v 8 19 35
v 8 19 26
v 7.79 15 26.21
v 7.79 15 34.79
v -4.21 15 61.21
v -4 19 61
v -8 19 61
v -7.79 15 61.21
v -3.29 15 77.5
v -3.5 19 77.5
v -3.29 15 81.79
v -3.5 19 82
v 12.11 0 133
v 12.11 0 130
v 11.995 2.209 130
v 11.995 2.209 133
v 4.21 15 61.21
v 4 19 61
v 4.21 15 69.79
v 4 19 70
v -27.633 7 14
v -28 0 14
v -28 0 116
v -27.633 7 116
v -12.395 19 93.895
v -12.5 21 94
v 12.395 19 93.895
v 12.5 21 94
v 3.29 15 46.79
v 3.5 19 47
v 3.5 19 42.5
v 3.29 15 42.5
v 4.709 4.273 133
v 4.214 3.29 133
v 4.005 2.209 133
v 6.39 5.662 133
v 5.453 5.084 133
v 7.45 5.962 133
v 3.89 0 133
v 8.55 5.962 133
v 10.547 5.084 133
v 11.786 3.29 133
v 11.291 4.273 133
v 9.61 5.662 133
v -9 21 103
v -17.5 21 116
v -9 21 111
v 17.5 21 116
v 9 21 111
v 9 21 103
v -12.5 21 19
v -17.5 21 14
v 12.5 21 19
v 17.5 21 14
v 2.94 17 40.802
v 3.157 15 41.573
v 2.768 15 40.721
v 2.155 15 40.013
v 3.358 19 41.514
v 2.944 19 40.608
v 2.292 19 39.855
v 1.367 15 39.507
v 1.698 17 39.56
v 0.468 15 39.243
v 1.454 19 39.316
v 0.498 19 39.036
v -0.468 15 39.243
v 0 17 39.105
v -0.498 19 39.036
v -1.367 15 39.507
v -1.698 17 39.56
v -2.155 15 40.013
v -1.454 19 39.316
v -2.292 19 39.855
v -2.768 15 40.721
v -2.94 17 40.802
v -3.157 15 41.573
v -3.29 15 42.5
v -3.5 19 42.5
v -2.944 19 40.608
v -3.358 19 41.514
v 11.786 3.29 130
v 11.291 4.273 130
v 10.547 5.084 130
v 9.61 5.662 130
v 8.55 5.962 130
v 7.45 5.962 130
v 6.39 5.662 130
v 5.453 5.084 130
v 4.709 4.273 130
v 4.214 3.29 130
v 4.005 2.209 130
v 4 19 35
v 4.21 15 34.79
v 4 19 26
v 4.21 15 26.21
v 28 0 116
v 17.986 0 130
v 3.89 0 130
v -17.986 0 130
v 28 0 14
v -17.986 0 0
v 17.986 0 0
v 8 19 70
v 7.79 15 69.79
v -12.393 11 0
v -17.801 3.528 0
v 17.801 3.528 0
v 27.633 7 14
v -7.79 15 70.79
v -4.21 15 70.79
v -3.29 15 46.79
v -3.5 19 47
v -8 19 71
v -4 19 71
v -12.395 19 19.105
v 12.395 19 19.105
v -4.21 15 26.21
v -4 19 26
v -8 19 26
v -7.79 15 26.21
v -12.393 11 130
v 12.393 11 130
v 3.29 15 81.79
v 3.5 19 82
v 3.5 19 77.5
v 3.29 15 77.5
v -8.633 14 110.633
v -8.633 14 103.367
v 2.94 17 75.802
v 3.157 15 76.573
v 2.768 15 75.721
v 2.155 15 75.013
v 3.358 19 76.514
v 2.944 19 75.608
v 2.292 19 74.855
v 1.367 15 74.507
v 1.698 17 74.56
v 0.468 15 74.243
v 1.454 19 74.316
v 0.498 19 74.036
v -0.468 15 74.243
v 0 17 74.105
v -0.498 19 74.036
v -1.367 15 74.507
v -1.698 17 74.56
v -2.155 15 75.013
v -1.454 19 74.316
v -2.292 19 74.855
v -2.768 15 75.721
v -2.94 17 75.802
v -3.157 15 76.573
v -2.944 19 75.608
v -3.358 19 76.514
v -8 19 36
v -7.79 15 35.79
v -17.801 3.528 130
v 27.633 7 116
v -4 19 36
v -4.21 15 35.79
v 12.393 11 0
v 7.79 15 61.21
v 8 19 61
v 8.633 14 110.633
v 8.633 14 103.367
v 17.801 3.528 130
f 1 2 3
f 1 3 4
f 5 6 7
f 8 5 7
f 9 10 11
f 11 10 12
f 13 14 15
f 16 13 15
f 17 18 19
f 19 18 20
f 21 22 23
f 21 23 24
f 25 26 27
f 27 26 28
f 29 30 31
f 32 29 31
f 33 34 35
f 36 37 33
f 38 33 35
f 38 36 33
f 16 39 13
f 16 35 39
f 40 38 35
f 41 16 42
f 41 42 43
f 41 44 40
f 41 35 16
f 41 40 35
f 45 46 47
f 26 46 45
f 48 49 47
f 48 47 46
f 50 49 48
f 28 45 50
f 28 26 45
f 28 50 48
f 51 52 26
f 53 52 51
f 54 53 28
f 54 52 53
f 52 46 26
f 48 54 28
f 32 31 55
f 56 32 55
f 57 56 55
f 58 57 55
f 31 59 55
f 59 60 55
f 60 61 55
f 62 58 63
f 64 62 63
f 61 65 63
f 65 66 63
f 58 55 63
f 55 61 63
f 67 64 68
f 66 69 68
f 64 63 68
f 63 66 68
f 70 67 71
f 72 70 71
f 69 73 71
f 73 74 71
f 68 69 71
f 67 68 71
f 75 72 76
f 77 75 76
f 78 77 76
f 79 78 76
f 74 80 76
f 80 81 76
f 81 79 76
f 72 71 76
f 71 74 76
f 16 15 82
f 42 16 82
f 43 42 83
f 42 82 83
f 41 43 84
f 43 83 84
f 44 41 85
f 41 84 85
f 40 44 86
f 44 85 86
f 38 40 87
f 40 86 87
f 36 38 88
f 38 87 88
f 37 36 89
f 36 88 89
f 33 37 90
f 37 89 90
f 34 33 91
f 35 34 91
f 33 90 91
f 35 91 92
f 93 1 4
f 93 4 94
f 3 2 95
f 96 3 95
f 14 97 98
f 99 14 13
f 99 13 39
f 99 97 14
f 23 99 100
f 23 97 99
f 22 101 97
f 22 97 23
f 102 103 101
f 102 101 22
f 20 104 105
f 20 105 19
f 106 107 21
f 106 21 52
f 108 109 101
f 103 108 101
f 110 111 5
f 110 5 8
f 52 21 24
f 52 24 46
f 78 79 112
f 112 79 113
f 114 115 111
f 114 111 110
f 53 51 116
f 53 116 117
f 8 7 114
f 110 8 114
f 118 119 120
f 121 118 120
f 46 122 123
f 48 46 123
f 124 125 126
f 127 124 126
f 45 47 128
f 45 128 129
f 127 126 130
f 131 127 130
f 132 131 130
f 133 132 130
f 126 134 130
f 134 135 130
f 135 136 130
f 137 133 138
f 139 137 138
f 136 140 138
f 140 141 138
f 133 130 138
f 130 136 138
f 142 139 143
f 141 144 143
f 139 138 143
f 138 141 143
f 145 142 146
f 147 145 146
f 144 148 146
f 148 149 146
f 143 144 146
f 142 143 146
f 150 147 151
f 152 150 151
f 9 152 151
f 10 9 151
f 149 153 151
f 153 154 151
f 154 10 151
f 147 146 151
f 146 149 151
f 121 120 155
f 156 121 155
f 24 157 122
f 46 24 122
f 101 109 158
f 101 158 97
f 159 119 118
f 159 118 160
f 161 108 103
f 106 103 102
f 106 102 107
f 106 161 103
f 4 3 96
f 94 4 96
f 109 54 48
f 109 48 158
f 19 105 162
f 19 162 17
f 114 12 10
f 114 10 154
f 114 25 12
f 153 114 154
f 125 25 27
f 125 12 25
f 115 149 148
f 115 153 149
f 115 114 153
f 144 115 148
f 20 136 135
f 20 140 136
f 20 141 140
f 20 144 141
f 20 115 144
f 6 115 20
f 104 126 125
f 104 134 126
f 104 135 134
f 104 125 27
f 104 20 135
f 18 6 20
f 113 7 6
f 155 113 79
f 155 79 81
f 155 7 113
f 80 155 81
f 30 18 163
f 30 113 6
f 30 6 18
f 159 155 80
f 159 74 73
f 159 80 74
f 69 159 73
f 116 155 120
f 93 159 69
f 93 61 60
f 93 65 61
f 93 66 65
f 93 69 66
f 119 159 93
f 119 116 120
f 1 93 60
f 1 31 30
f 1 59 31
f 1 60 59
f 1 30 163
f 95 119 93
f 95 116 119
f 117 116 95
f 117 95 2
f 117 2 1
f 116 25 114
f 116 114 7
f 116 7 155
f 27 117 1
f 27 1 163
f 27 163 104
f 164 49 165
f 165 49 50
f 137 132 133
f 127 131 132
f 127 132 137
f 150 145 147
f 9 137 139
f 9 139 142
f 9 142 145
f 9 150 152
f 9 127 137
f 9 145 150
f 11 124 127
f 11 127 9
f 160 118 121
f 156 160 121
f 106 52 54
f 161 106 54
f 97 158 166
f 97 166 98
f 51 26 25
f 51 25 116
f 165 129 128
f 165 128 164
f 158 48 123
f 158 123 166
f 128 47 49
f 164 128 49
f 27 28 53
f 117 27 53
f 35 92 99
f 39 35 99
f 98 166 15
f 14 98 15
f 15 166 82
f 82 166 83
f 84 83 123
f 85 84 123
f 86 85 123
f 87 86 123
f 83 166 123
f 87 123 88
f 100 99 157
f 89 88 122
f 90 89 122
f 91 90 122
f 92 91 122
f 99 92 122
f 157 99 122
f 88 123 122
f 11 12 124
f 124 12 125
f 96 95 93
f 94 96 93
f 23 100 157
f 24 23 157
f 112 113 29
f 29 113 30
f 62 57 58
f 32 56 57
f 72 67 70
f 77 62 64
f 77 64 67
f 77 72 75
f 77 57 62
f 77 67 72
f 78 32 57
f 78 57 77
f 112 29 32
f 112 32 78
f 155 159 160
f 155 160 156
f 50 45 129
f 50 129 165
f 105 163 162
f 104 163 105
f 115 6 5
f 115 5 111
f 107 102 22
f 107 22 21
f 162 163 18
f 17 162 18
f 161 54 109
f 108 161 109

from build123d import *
from OCP.BRepFilletAPI import BRepFilletAPI_MakeChamfer

# Parameters (mm, degrees)
EXTRUDE1_DEPTH               = 130
CHAMFER1_SIZE                = 14
CHAMFER1_SIZE2               = 10
CHAMFER2_SIZE                = 10
CHAMFER2_SIZE2               = 14
EXTRUDE2_DEPTH               = 3
SKETCH3_W                    = 25
SKETCH3_H                    = 75
CUT_EXTRUDE1_DEPTH           = 2
CUT_EXTRUDE1_DRAFT           = -3
SKETCH4_W                    = 4
SKETCH4_H                    = 9
CUT_EXTRUDE2_DEPTH           = 4
CUT_EXTRUDE2_DRAFT           = -3
SKETCH4_H_2                  = 10
CUT_EXTRUDE2_PROFILE_2_DEPTH = 4
CUT_EXTRUDE2_PROFILE_2_DRAFT = -3
CUT_EXTRUDE2_PROFILE_3_DEPTH = 4
CUT_EXTRUDE2_PROFILE_3_DRAFT = -3
LPATTERN1_COPY_1_SKETCH_W    = 4
LPATTERN1_COPY_1_SKETCH_H    = 9
LPATTERN1_COPY_1_DEPTH       = 4
LPATTERN1_COPY_1_DRAFT       = -3
LPATTERN1_COPY_2_SKETCH_W    = 4
LPATTERN1_COPY_2_SKETCH_H    = 10
LPATTERN1_COPY_2_DEPTH       = 4
LPATTERN1_COPY_2_DRAFT       = -3
LPATTERN1_COPY_3_DEPTH       = 4
LPATTERN1_COPY_3_DRAFT       = -3
LPATTERN1_COPY_4_SKETCH_W    = 4
LPATTERN1_COPY_4_SKETCH_H    = 10
LPATTERN1_COPY_4_DEPTH       = 4
LPATTERN1_COPY_4_DRAFT       = -3
LPATTERN1_COPY_5_DEPTH       = 4
LPATTERN1_COPY_5_DRAFT       = -3
SKETCH5_W                    = 18
SKETCH5_H                    = 8
CUT_EXTRUDE3_DEPTH           = 7
CUT_EXTRUDE3_DRAFT           = -3


with BuildPart() as part:
    # Sketch1 → Extrude1 (new body)
    with BuildSketch(Plane.XY):
        Polygon((17.5, 21), (27.633145545, 7), (28, 0), (-28, 0), (-27.633145545, 7), (-17.5, 21), align=None)
    extrude(amount=EXTRUDE1_DEPTH)

    # Chamfer1: one chamfer whose edges measure the first distance from different faces: ONE call of the kernel's chamfer builder (chamfer() names one face for all edges)
    chamfer1_edges_1 = [part.edges().sort_by_distance(p)[0] for p in [
        (0, 21, 130),
    ]]
    chamfer1_side_1 = [part.faces().sort_by_distance(p)[0] for p in [
        (0, 21, 65),
    ]]
    chamfer1_edges_2 = [part.edges().sort_by_distance(p)[0] for p in [
        (-22.566572773, 14, 130),
    ]]
    chamfer1_side_2 = [part.faces().sort_by_distance(p)[0] for p in [
        (-22.566572773, 14, 65),
    ]]
    chamfer1_edges_3 = [part.edges().sort_by_distance(p)[0] for p in [
        (-27.816572773, 3.5, 130),
    ]]
    chamfer1_side_3 = [part.faces().sort_by_distance(p)[0] for p in [
        (-27.816572773, 3.5, 65),
    ]]
    chamfer1_edges_4 = [part.edges().sort_by_distance(p)[0] for p in [
        (27.816572773, 3.5, 130),
    ]]
    chamfer1_side_4 = [part.faces().sort_by_distance(p)[0] for p in [
        (27.816572773, 3.5, 65),
    ]]
    chamfer1_edges_5 = [part.edges().sort_by_distance(p)[0] for p in [
        (22.566572773, 14, 130),
    ]]
    chamfer1_side_5 = [part.faces().sort_by_distance(p)[0] for p in [
        (22.566572773, 14, 65),
    ]]
    chamfer1 = BRepFilletAPI_MakeChamfer(part.part.solid().wrapped)
    for e in chamfer1_edges_1:
        chamfer1.Add(CHAMFER1_SIZE, CHAMFER1_SIZE2, e.wrapped, chamfer1_side_1[0].wrapped)  # the first distance lies on this face
    for e in chamfer1_edges_2:
        chamfer1.Add(CHAMFER1_SIZE, CHAMFER1_SIZE2, e.wrapped, chamfer1_side_2[0].wrapped)  # the first distance lies on this face
    for e in chamfer1_edges_3:
        chamfer1.Add(CHAMFER1_SIZE, CHAMFER1_SIZE2, e.wrapped, chamfer1_side_3[0].wrapped)  # the first distance lies on this face
    for e in chamfer1_edges_4:
        chamfer1.Add(CHAMFER1_SIZE, CHAMFER1_SIZE2, e.wrapped, chamfer1_side_4[0].wrapped)  # the first distance lies on this face
    for e in chamfer1_edges_5:
        chamfer1.Add(CHAMFER1_SIZE, CHAMFER1_SIZE2, e.wrapped, chamfer1_side_5[0].wrapped)  # the first distance lies on this face
    add(Compound.cast(chamfer1.Shape()), mode=Mode.REPLACE)

    # Chamfer2
    chamfer2_edges = [part.edges().sort_by_distance(p)[0] for p in [
        (-27.816572773, 3.5, 0),
        (-22.566572773, 14, 0),
        (0, 21, 0),
        (22.566572773, 14, 0),
        (27.816572773, 3.5, 0),
    ]]
    chamfer2_side = [part.faces().sort_by_distance(p)[0] for p in [
        (0, 9.6691811, 0),
    ]]
    chamfer(chamfer2_edges, length=CHAMFER2_SIZE, length2=CHAMFER2_SIZE2, reference=chamfer2_side[0])

    # Sketch2 → Extrude2 (add)
    with BuildSketch(Plane(origin=(5.745184329, -1.894827458, 130), x_dir=(1, 0, 0), z_dir=(0, 0, 1))):
        with BuildLine():
            Line((-1.855489271, 1.894827458), (6.365120614, 1.894827458))
            Line((6.365120614, 1.894827458), (6.24933381, 4.104171283))
            ThreePointArc((6.24933381, 4.104171283), (2.254815671, 7.894827458), (-1.739702468, 4.104171283))
            Line((-1.739702468, 4.104171283), (-1.855489271, 1.894827458))
        make_face()
    extrude(amount=EXTRUDE2_DEPTH)


with BuildPart() as cut_extrude1_tool:
    # Sketch3 → Cut-Extrude1 (with draft: the straight prism first)
    with BuildSketch(Plane(origin=(3.492514123, 21, 107.578199621), x_dir=(1, 0, 0), z_dir=(0, 1, 0))):
        with Locations((-3.492514123, 51.078199621)):
            Rectangle(SKETCH3_W, SKETCH3_H)
    extrude(amount=-CUT_EXTRUDE1_DEPTH)
    # Cut-Extrude1: the draft: its side faces are tilted about the plane it starts from
    cut_extrude1_sides = [cut_extrude1_tool.faces().sort_by_distance(p)[0] for p in [
        (0, 20, 19),
        (-12.5, 20, 56.5),
        (0, 20, 94),
        (12.5, 20, 56.5),
    ]]
    draft(cut_extrude1_sides, Plane(origin=(3.492514123, 21, 107.578199621), x_dir=(1, 0, 0), z_dir=(0, 1, 0)), CUT_EXTRUDE1_DRAFT)


with BuildPart() as part_1:
    add(part.part)

    # Cut-Extrude1: cut by cut_extrude1_tool
    add(cut_extrude1_tool.part, mode=Mode.SUBTRACT)


with BuildPart() as cut_extrude2_tool:
    # Sketch4 → Cut-Extrude2 (with draft: the straight prism first)
    with BuildSketch(Plane(origin=(-3.08260661, 19, 40.468913064), x_dir=(-1, 0, 0), z_dir=(0, 1, 0))):
        with Locations((-9.08260661, -9.968913064)):
            Rectangle(SKETCH4_W, SKETCH4_H)
    extrude(amount=-CUT_EXTRUDE2_DEPTH)
    # Cut-Extrude2: the draft: its side faces are tilted about the plane it starts from
    cut_extrude2_sides = [cut_extrude2_tool.faces().sort_by_distance(p)[0] for p in [
        (4, 17, 30.5),
        (6, 17, 35),
        (8, 17, 30.5),
        (6, 17, 26),
    ]]
    draft(cut_extrude2_sides, Plane(origin=(-3.08260661, 19, 40.468913064), x_dir=(-1, 0, 0), z_dir=(0, 1, 0)), CUT_EXTRUDE2_DRAFT)


with BuildPart() as part_2:
    add(part_1.part)

    # Cut-Extrude2: cut by cut_extrude2_tool
    add(cut_extrude2_tool.part, mode=Mode.SUBTRACT)


with BuildPart() as cut_extrude2_profile_2_tool:
    # Sketch4 → Cut-Extrude2 profile 2 (with draft: the straight prism first)
    with BuildSketch(Plane(origin=(-3.08260661, 19, 40.468913064), x_dir=(-1, 0, 0), z_dir=(0, 1, 0))):
        with Locations((2.91739339, -9.468913064)):
            Rectangle(SKETCH4_W, SKETCH4_H_2)
    extrude(amount=-CUT_EXTRUDE2_PROFILE_2_DEPTH)
    # Cut-Extrude2 profile 2: the draft: its side faces are tilted about the plane it starts from
    cut_extrude2_profile_2_sides = [cut_extrude2_profile_2_tool.faces().sort_by_distance(p)[0] for p in [
        (-8, 17, 31),
        (-6, 17, 36),
        (-4, 17, 31),
        (-6, 17, 26),
    ]]
    draft(cut_extrude2_profile_2_sides, Plane(origin=(-3.08260661, 19, 40.468913064), x_dir=(-1, 0, 0), z_dir=(0, 1, 0)), CUT_EXTRUDE2_PROFILE_2_DRAFT)


with BuildPart() as part_3:
    add(part_2.part)

    # Cut-Extrude2 profile 2: cut by cut_extrude2_profile_2_tool
    add(cut_extrude2_profile_2_tool.part, mode=Mode.SUBTRACT)


with BuildPart() as cut_extrude2_profile_3_tool:
    # Sketch4 → Cut-Extrude2 profile 3 (with draft: the straight prism first)
    with BuildSketch(Plane(origin=(-3.08260661, 19, 40.468913064), x_dir=(-1, 0, 0), z_dir=(0, 1, 0))):
        with BuildLine():
            Line((-6.58260661, 6.531086936), (-6.58260661, 2.031086936))
            ThreePointArc((-6.58260661, 2.031086936), (-3.08260661, -1.468913064), (0.41739339, 2.031086936))
            Line((0.41739339, 2.031086936), (0.41739339, 6.531086936))
            Line((0.41739339, 6.531086936), (-6.58260661, 6.531086936))
        make_face()
    extrude(amount=-CUT_EXTRUDE2_PROFILE_3_DEPTH)
    # Cut-Extrude2 profile 3: the draft: its side faces are tilted about the plane it starts from
    cut_extrude2_profile_3_sides = [cut_extrude2_profile_3_tool.faces().sort_by_distance(p)[0] for p in [
        (-3.5, 17, 44.75),
        (0, 17, 47),
        (3.5, 17, 44.75),
        (0, 17, 39),
    ]]
    draft(cut_extrude2_profile_3_sides, Plane(origin=(-3.08260661, 19, 40.468913064), x_dir=(-1, 0, 0), z_dir=(0, 1, 0)), CUT_EXTRUDE2_PROFILE_3_DRAFT)


with BuildPart() as part_4:
    add(part_3.part)

    # Cut-Extrude2 profile 3: cut by cut_extrude2_profile_3_tool
    add(cut_extrude2_profile_3_tool.part, mode=Mode.SUBTRACT)


with BuildPart() as lpattern1_copy_1_tool:
    # LPattern1 copy 1 sketch → LPattern1 copy 1 (with draft: the straight prism first)
    with BuildSketch(Plane(origin=(-3.08260661, 19, 75.468913064), x_dir=(-1, 0, 0), z_dir=(0, 1, 0))):
        with Locations((-9.08260661, -9.968913064)):
            Rectangle(LPATTERN1_COPY_1_SKETCH_W, LPATTERN1_COPY_1_SKETCH_H)
    extrude(amount=-LPATTERN1_COPY_1_DEPTH)
    # LPattern1 copy 1: the draft: its side faces are tilted about the plane it starts from
    lpattern1_copy_1_sides = [lpattern1_copy_1_tool.faces().sort_by_distance(p)[0] for p in [
        (4, 17, 65.5),
        (6, 17, 70),
        (8, 17, 65.5),
        (6, 17, 61),
    ]]
    draft(lpattern1_copy_1_sides, Plane(origin=(-3.08260661, 19, 75.468913064), x_dir=(-1, 0, 0), z_dir=(0, 1, 0)), LPATTERN1_COPY_1_DRAFT)


with BuildPart() as part_5:
    add(part_4.part)

    # LPattern1 copy 1: cut by lpattern1_copy_1_tool
    add(lpattern1_copy_1_tool.part, mode=Mode.SUBTRACT)


with BuildPart() as lpattern1_copy_2_tool:
    # LPattern1 copy 2 sketch → LPattern1 copy 2 (with draft: the straight prism first)
    with BuildSketch(Plane(origin=(-3.08260661, 19, 75.468913064), x_dir=(-1, 0, 0), z_dir=(0, 1, 0))):
        with Locations((2.91739339, -9.468913064)):
            Rectangle(LPATTERN1_COPY_2_SKETCH_W, LPATTERN1_COPY_2_SKETCH_H)
    extrude(amount=-LPATTERN1_COPY_2_DEPTH)
    # LPattern1 copy 2: the draft: its side faces are tilted about the plane it starts from
    lpattern1_copy_2_sides = [lpattern1_copy_2_tool.faces().sort_by_distance(p)[0] for p in [
        (-8, 17, 66),
        (-6, 17, 71),
        (-4, 17, 66),
        (-6, 17, 61),
    ]]
    draft(lpattern1_copy_2_sides, Plane(origin=(-3.08260661, 19, 75.468913064), x_dir=(-1, 0, 0), z_dir=(0, 1, 0)), LPATTERN1_COPY_2_DRAFT)


with BuildPart() as part_6:
    add(part_5.part)

    # LPattern1 copy 2: cut by lpattern1_copy_2_tool
    add(lpattern1_copy_2_tool.part, mode=Mode.SUBTRACT)


with BuildPart() as lpattern1_copy_3_tool:
    # LPattern1 copy 3 sketch → LPattern1 copy 3 (with draft: the straight prism first)
    with BuildSketch(Plane(origin=(-3.08260661, 19, 75.468913064), x_dir=(-1, 0, 0), z_dir=(0, 1, 0))):
        with BuildLine():
            Line((-6.58260661, 6.531086936), (-6.58260661, 2.031086936))
            ThreePointArc((-6.58260661, 2.031086936), (-3.08260661, -1.468913064), (0.41739339, 2.031086936))
            Line((0.41739339, 2.031086936), (0.41739339, 6.531086936))
            Line((0.41739339, 6.531086936), (-6.58260661, 6.531086936))
        make_face()
    extrude(amount=-LPATTERN1_COPY_3_DEPTH)
    # LPattern1 copy 3: the draft: its side faces are tilted about the plane it starts from
    lpattern1_copy_3_sides = [lpattern1_copy_3_tool.faces().sort_by_distance(p)[0] for p in [
        (-3.5, 17, 79.75),
        (0, 17, 82),
        (3.5, 17, 79.75),
        (0, 17, 74),
    ]]
    draft(lpattern1_copy_3_sides, Plane(origin=(-3.08260661, 19, 75.468913064), x_dir=(-1, 0, 0), z_dir=(0, 1, 0)), LPATTERN1_COPY_3_DRAFT)


with BuildPart() as part_7:
    add(part_6.part)

    # LPattern1 copy 3: cut by lpattern1_copy_3_tool
    add(lpattern1_copy_3_tool.part, mode=Mode.SUBTRACT)


with BuildPart() as lpattern1_copy_4_tool:
    # LPattern1 copy 4 sketch → LPattern1 copy 4 (with draft: the straight prism first)
    with BuildSketch(Plane(origin=(-3.08260661, 19, 75.468913064), x_dir=(-1, 0, 0), z_dir=(0, 1, 0))):
        with Locations((2.91739339, -9.468913064)):
            Rectangle(LPATTERN1_COPY_4_SKETCH_W, LPATTERN1_COPY_4_SKETCH_H)
    extrude(amount=-LPATTERN1_COPY_4_DEPTH)
    # LPattern1 copy 4: the draft: its side faces are tilted about the plane it starts from
    lpattern1_copy_4_sides = [lpattern1_copy_4_tool.faces().sort_by_distance(p)[0] for p in [
        (-8, 17, 66),
        (-6, 17, 71),
        (-4, 17, 66),
        (-6, 17, 61),
    ]]
    draft(lpattern1_copy_4_sides, Plane(origin=(-3.08260661, 19, 75.468913064), x_dir=(-1, 0, 0), z_dir=(0, 1, 0)), LPATTERN1_COPY_4_DRAFT)


with BuildPart() as part_8:
    add(part_7.part)

    # LPattern1 copy 4: cut by lpattern1_copy_4_tool
    add(lpattern1_copy_4_tool.part, mode=Mode.SUBTRACT)


with BuildPart() as lpattern1_copy_5_tool:
    # LPattern1 copy 5 sketch → LPattern1 copy 5 (with draft: the straight prism first)
    with BuildSketch(Plane(origin=(-3.08260661, 19, 75.468913064), x_dir=(-1, 0, 0), z_dir=(0, 1, 0))):
        with BuildLine():
            Line((-6.58260661, 6.531086936), (-6.58260661, 2.031086936))
            ThreePointArc((-6.58260661, 2.031086936), (-3.08260661, -1.468913064), (0.41739339, 2.031086936))
            Line((0.41739339, 2.031086936), (0.41739339, 6.531086936))
            Line((0.41739339, 6.531086936), (-6.58260661, 6.531086936))
        make_face()
    extrude(amount=-LPATTERN1_COPY_5_DEPTH)
    # LPattern1 copy 5: the draft: its side faces are tilted about the plane it starts from
    lpattern1_copy_5_sides = [lpattern1_copy_5_tool.faces().sort_by_distance(p)[0] for p in [
        (-3.5, 17, 79.75),
        (0, 17, 82),
        (3.5, 17, 79.75),
        (0, 17, 74),
    ]]
    draft(lpattern1_copy_5_sides, Plane(origin=(-3.08260661, 19, 75.468913064), x_dir=(-1, 0, 0), z_dir=(0, 1, 0)), LPATTERN1_COPY_5_DRAFT)


with BuildPart() as part_9:
    add(part_8.part)

    # LPattern1 copy 5: cut by lpattern1_copy_5_tool
    add(lpattern1_copy_5_tool.part, mode=Mode.SUBTRACT)


with BuildPart() as cut_extrude3_tool:
    # Sketch5 → Cut-Extrude3 (with draft: the straight prism first)
    with BuildSketch(Plane(origin=(0.792567218, 21, 213.513140982), x_dir=(1, 0, 0), z_dir=(0, 1, 0))):
        with Locations((-0.792567218, 106.513140982)):
            Rectangle(SKETCH5_W, SKETCH5_H)
    extrude(amount=-CUT_EXTRUDE3_DEPTH)
    # Cut-Extrude3: the draft: its side faces are tilted about the plane it starts from
    cut_extrude3_sides = [cut_extrude3_tool.faces().sort_by_distance(p)[0] for p in [
        (0, 17.5, 111),
        (9, 17.5, 107),
        (0, 17.5, 103),
        (-9, 17.5, 107),
    ]]
    draft(cut_extrude3_sides, Plane(origin=(0.792567218, 21, 213.513140982), x_dir=(1, 0, 0), z_dir=(0, 1, 0)), CUT_EXTRUDE3_DRAFT)


with BuildPart() as part_10:
    add(part_9.part)

    # Cut-Extrude3: cut by cut_extrude3_tool
    add(cut_extrude3_tool.part, mode=Mode.SUBTRACT)


solid = part_10.part
